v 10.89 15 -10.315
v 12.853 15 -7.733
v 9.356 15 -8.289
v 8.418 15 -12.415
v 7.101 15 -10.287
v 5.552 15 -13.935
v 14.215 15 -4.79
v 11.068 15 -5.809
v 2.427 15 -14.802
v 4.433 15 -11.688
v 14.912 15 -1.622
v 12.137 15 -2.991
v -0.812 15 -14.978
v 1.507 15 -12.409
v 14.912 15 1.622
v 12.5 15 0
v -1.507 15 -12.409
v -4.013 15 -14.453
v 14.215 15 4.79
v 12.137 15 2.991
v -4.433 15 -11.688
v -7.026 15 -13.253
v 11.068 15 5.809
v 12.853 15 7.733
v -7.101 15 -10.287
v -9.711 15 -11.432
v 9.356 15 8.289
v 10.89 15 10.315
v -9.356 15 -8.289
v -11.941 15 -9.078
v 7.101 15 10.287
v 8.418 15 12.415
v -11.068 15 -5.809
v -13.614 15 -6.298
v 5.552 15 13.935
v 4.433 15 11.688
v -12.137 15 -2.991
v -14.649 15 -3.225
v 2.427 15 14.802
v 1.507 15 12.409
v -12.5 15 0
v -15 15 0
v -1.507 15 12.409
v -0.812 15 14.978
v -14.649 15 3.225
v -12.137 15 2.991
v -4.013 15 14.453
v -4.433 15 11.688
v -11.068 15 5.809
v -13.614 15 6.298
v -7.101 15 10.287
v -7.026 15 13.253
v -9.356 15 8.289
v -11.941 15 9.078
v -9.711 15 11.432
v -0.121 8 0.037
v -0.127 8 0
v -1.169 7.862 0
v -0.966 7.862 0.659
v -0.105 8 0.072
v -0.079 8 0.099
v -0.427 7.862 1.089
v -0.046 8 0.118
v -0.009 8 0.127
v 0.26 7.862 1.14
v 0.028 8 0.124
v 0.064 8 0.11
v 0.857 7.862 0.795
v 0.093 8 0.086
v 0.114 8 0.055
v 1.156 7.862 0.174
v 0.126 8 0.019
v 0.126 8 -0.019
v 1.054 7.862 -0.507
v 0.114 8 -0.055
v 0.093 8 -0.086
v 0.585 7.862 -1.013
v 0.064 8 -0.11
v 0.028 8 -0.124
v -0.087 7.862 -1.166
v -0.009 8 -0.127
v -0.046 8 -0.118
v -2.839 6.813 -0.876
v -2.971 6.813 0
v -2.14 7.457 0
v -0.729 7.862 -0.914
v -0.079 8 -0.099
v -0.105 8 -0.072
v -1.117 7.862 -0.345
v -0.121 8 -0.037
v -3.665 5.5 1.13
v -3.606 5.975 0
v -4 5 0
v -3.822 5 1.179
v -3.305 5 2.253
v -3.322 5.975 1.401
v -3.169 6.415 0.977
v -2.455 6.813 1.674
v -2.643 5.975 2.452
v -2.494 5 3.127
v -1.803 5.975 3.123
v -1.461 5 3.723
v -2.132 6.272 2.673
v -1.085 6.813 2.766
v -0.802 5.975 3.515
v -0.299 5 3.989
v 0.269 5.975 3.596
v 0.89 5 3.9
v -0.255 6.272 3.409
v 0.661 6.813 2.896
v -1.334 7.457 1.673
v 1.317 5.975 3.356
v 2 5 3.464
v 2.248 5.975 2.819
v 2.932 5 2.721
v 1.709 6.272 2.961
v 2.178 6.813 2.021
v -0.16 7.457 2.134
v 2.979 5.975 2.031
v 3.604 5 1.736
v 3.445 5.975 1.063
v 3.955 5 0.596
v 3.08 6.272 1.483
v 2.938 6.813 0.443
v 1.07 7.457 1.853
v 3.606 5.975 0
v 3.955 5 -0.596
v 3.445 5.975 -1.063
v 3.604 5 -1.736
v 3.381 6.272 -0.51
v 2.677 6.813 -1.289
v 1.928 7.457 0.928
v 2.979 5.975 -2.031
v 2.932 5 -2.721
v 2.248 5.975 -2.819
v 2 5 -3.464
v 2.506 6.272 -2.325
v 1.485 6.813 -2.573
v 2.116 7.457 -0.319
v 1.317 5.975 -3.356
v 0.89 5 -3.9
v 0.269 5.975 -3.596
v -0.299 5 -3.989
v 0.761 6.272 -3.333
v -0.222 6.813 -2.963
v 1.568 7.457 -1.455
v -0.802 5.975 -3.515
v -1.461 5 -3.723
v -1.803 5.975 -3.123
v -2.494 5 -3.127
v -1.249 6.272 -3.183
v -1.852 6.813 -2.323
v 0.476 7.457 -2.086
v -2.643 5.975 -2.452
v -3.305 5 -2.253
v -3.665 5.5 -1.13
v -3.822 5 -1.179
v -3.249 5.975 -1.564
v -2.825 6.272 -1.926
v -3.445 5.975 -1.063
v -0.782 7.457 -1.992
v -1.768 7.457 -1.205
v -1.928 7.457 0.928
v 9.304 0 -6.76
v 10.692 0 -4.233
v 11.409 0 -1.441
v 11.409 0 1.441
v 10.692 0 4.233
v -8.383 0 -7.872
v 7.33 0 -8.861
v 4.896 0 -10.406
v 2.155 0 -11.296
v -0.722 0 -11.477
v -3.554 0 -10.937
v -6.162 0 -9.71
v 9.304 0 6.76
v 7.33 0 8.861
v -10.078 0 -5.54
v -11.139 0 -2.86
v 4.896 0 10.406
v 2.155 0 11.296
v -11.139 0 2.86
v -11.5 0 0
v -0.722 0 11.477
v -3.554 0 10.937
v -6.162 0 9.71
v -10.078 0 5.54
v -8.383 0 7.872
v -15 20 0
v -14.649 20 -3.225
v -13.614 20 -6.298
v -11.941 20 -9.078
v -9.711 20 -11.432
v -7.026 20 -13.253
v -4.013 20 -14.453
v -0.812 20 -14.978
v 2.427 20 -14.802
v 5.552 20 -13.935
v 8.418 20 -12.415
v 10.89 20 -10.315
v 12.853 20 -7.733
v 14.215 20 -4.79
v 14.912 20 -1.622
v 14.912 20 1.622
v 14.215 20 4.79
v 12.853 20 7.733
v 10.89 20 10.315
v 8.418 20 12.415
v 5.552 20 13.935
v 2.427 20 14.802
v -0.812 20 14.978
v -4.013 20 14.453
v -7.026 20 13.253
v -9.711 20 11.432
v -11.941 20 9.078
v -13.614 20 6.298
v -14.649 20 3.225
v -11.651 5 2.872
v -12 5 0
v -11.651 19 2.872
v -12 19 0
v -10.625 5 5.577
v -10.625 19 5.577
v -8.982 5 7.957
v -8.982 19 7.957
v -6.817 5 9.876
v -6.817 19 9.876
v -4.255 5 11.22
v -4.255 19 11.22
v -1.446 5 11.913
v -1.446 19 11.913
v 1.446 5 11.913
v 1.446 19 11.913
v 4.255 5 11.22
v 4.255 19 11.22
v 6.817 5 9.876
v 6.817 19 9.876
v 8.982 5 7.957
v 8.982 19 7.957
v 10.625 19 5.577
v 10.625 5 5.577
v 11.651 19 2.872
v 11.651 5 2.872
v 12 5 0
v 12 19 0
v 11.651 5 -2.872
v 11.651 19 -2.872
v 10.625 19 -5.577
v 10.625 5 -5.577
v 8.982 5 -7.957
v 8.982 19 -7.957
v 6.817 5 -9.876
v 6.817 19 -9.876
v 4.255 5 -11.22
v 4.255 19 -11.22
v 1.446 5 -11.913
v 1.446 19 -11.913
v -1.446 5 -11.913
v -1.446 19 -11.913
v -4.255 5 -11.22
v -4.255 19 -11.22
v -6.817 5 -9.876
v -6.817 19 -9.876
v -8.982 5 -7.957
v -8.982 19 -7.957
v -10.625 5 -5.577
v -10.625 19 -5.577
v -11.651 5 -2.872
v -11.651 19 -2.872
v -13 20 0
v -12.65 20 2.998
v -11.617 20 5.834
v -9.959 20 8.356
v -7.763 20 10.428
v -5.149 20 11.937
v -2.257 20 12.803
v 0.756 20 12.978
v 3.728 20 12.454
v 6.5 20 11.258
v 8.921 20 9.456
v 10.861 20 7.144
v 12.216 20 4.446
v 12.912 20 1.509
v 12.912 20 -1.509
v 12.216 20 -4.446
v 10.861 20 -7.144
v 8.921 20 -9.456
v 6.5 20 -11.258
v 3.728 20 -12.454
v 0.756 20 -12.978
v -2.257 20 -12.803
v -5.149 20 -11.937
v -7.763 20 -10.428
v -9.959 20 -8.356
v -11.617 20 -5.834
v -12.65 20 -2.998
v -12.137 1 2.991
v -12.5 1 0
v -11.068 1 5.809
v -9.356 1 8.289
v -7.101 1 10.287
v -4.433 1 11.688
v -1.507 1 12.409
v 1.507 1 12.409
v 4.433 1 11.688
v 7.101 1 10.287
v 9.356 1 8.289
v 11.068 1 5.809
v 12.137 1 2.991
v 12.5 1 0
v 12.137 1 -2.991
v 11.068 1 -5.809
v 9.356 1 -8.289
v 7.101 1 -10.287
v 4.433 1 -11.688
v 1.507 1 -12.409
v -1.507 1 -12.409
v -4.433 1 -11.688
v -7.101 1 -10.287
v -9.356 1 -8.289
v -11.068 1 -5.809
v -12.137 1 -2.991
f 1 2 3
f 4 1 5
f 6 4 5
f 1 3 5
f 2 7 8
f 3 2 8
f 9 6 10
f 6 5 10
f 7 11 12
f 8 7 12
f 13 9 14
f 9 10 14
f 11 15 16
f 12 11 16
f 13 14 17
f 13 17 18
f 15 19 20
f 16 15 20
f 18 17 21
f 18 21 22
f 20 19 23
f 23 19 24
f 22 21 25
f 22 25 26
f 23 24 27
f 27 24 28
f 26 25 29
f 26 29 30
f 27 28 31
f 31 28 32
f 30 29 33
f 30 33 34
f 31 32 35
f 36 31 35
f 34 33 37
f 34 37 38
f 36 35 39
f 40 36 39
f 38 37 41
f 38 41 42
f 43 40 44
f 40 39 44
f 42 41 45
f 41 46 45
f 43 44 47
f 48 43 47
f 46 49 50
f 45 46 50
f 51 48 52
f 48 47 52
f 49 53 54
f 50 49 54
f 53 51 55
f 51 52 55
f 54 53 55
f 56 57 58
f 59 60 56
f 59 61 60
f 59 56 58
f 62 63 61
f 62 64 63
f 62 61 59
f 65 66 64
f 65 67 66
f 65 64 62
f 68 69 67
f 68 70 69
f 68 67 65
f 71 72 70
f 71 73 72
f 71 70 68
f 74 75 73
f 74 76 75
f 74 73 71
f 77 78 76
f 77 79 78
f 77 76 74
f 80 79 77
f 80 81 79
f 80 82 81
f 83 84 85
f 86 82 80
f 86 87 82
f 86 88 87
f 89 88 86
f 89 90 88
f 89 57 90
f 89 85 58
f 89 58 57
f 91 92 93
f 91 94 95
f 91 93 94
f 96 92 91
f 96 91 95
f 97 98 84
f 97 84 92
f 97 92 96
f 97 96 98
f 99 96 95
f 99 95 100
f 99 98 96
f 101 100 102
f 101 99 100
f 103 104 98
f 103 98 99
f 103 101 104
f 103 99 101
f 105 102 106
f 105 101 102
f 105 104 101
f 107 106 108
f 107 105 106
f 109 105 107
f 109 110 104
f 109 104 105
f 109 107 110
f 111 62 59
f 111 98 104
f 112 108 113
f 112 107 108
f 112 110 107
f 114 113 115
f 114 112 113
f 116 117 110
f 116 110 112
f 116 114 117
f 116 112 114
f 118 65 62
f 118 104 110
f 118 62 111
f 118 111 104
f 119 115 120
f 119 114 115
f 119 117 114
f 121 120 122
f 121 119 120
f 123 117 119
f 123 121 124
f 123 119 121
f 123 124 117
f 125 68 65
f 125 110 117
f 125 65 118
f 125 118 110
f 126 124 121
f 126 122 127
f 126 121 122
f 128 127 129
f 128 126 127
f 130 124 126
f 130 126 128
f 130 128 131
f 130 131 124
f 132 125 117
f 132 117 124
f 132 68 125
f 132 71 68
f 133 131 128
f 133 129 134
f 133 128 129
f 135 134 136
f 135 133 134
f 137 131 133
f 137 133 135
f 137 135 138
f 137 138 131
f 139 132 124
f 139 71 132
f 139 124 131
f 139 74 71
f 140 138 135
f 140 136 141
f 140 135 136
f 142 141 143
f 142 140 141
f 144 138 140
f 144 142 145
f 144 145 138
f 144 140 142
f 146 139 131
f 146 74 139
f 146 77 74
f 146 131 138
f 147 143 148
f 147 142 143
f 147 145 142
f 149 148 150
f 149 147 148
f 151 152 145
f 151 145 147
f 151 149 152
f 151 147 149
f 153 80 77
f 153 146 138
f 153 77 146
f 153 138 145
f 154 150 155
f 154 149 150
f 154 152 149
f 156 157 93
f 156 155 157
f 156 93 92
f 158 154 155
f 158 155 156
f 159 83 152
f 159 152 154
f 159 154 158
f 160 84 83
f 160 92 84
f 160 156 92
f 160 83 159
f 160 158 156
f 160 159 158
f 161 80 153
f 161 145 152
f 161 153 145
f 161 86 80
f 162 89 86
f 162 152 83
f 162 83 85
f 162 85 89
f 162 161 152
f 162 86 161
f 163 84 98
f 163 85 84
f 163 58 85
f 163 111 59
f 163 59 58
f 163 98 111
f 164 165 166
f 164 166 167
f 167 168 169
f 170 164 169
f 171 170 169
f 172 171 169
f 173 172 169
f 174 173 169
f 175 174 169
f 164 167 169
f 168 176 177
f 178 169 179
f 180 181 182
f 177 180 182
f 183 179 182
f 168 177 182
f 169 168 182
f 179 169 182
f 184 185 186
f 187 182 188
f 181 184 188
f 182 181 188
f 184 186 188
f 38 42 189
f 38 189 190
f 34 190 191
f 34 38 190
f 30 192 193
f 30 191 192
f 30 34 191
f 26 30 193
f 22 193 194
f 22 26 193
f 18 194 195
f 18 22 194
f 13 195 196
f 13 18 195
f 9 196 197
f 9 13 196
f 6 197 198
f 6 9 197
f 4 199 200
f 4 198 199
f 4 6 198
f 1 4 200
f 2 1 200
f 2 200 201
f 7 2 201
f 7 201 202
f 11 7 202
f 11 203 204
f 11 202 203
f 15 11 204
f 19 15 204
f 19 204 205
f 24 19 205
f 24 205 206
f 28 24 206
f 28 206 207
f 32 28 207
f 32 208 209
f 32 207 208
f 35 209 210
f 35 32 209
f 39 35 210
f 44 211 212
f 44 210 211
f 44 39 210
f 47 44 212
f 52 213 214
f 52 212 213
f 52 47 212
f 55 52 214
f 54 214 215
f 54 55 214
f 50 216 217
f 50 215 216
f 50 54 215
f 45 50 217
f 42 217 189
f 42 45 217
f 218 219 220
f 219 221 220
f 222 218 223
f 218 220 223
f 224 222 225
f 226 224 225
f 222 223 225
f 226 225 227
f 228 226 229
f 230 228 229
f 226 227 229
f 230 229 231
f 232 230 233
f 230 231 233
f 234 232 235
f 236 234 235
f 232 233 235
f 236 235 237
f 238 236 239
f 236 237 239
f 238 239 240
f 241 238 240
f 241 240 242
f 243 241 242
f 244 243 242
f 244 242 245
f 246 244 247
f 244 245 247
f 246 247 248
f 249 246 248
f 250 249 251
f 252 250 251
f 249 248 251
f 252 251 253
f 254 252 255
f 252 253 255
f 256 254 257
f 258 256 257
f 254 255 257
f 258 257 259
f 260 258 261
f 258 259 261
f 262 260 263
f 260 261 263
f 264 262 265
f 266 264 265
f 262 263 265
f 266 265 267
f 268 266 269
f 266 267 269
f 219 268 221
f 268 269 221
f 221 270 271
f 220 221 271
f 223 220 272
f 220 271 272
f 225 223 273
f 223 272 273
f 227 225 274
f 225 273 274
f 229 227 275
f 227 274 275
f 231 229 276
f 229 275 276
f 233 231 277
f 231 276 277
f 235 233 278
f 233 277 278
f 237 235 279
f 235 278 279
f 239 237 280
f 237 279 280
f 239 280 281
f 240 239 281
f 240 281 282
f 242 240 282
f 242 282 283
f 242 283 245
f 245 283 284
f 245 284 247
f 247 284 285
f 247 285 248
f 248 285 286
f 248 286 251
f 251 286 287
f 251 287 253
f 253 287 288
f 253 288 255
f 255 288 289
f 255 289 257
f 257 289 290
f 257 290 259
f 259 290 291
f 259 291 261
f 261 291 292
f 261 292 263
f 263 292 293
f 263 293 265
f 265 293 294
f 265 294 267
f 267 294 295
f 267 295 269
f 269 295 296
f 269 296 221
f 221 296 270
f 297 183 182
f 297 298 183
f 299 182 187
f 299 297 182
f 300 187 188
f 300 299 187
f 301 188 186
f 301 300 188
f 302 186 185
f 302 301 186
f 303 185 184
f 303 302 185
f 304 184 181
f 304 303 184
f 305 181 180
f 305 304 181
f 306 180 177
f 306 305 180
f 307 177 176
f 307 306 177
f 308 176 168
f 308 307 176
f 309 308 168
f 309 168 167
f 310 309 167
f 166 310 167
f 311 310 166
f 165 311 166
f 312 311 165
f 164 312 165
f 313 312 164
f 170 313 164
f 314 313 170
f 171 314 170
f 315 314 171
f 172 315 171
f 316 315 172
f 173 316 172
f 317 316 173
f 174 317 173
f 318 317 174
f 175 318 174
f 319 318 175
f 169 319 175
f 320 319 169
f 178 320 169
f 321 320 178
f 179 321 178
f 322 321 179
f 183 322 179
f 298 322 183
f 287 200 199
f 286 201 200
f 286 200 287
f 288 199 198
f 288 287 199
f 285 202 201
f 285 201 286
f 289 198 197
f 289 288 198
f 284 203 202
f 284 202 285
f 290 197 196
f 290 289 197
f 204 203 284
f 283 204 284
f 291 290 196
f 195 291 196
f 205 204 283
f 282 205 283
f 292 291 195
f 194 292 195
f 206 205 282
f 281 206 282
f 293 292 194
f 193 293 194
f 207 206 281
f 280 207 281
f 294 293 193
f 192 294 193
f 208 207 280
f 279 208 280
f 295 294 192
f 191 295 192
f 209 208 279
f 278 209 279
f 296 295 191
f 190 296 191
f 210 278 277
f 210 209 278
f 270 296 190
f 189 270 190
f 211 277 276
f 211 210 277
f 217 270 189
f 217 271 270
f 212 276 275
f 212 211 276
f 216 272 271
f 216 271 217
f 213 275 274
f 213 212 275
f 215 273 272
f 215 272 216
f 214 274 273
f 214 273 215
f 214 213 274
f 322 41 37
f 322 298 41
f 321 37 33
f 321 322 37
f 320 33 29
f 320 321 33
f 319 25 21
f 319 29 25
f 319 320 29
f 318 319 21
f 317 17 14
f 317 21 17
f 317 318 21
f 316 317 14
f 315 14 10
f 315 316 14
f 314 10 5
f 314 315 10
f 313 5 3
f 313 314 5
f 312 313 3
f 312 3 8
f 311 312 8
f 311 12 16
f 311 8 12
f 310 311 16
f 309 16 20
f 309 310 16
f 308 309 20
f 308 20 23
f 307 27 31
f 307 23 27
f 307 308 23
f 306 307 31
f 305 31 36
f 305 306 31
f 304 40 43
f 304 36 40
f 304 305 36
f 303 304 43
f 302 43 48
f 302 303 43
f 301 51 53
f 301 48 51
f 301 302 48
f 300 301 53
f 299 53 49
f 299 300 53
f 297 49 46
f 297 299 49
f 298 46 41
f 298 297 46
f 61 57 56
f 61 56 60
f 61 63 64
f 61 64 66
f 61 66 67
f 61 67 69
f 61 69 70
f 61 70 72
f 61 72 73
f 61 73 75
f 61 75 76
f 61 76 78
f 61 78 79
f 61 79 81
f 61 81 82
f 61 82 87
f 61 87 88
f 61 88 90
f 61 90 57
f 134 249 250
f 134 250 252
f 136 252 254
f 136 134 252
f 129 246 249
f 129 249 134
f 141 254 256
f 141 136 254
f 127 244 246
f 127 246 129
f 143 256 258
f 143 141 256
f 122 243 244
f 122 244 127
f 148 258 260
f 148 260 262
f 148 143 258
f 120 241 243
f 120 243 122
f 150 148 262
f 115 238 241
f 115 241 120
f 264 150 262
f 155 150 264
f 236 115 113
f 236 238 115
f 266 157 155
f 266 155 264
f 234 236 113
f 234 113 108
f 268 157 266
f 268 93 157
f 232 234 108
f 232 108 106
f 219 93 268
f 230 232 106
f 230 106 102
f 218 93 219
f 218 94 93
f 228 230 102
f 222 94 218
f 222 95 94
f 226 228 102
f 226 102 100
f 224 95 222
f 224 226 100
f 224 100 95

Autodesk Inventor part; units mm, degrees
ref_plane "YZ Plane" through (0, 0, 0) normal (1, 0, 0) x (0, 1, 0)
ref_plane "XZ Plane" through (0, 0, 0) normal (0, 1, 0) x (-1, 0, 0)
ref_plane "XY Plane" through (0, 0, 0) normal (0, 0, 1) x (1, 0, 0)
sketch "Szkic1" plane through (0, 0, 0) normal (0, 1, 0) x (-1, 0, 0)
  circle A0 centre (0, 0) radius 15
  circle A1 centre (0, 0) radius 12
  circle A2 centre (0, 0) radius 12.5
  circle A3 centre (0, 0) radius 4
  dimension "d0" = 30
  dimension "d1" = 24
  dimension "d2" = 25
  dimension "d12" = 8
extrude "Wyciągnięcie proste1" add sketch "Szkic1" along normal blind 20 contours A0 | A1 | A2 | A3
extrude "Wyciągnięcie proste2" cut sketch "Szkic1" against normal blind 15 from surface at 20 contours A1 | A3
extrude "Wyciągnięcie proste3" cut sketch "Szkic1" along normal blind 15 contours A0
chamfer "Faza1" distance 1 angle 45 2 edges at (12.5, 0, 0) (12, 20, 0)
extrude "Wyciągnięcie proste4" add sketch "Szkic1" along normal blind 8 contours A3
fillet "Zaokrąglenie1" radius 4 1 edges at (4, 8, 0)
properties part number "Z_screw_lower_end" material "Tworzywo sztuczne ABS"
